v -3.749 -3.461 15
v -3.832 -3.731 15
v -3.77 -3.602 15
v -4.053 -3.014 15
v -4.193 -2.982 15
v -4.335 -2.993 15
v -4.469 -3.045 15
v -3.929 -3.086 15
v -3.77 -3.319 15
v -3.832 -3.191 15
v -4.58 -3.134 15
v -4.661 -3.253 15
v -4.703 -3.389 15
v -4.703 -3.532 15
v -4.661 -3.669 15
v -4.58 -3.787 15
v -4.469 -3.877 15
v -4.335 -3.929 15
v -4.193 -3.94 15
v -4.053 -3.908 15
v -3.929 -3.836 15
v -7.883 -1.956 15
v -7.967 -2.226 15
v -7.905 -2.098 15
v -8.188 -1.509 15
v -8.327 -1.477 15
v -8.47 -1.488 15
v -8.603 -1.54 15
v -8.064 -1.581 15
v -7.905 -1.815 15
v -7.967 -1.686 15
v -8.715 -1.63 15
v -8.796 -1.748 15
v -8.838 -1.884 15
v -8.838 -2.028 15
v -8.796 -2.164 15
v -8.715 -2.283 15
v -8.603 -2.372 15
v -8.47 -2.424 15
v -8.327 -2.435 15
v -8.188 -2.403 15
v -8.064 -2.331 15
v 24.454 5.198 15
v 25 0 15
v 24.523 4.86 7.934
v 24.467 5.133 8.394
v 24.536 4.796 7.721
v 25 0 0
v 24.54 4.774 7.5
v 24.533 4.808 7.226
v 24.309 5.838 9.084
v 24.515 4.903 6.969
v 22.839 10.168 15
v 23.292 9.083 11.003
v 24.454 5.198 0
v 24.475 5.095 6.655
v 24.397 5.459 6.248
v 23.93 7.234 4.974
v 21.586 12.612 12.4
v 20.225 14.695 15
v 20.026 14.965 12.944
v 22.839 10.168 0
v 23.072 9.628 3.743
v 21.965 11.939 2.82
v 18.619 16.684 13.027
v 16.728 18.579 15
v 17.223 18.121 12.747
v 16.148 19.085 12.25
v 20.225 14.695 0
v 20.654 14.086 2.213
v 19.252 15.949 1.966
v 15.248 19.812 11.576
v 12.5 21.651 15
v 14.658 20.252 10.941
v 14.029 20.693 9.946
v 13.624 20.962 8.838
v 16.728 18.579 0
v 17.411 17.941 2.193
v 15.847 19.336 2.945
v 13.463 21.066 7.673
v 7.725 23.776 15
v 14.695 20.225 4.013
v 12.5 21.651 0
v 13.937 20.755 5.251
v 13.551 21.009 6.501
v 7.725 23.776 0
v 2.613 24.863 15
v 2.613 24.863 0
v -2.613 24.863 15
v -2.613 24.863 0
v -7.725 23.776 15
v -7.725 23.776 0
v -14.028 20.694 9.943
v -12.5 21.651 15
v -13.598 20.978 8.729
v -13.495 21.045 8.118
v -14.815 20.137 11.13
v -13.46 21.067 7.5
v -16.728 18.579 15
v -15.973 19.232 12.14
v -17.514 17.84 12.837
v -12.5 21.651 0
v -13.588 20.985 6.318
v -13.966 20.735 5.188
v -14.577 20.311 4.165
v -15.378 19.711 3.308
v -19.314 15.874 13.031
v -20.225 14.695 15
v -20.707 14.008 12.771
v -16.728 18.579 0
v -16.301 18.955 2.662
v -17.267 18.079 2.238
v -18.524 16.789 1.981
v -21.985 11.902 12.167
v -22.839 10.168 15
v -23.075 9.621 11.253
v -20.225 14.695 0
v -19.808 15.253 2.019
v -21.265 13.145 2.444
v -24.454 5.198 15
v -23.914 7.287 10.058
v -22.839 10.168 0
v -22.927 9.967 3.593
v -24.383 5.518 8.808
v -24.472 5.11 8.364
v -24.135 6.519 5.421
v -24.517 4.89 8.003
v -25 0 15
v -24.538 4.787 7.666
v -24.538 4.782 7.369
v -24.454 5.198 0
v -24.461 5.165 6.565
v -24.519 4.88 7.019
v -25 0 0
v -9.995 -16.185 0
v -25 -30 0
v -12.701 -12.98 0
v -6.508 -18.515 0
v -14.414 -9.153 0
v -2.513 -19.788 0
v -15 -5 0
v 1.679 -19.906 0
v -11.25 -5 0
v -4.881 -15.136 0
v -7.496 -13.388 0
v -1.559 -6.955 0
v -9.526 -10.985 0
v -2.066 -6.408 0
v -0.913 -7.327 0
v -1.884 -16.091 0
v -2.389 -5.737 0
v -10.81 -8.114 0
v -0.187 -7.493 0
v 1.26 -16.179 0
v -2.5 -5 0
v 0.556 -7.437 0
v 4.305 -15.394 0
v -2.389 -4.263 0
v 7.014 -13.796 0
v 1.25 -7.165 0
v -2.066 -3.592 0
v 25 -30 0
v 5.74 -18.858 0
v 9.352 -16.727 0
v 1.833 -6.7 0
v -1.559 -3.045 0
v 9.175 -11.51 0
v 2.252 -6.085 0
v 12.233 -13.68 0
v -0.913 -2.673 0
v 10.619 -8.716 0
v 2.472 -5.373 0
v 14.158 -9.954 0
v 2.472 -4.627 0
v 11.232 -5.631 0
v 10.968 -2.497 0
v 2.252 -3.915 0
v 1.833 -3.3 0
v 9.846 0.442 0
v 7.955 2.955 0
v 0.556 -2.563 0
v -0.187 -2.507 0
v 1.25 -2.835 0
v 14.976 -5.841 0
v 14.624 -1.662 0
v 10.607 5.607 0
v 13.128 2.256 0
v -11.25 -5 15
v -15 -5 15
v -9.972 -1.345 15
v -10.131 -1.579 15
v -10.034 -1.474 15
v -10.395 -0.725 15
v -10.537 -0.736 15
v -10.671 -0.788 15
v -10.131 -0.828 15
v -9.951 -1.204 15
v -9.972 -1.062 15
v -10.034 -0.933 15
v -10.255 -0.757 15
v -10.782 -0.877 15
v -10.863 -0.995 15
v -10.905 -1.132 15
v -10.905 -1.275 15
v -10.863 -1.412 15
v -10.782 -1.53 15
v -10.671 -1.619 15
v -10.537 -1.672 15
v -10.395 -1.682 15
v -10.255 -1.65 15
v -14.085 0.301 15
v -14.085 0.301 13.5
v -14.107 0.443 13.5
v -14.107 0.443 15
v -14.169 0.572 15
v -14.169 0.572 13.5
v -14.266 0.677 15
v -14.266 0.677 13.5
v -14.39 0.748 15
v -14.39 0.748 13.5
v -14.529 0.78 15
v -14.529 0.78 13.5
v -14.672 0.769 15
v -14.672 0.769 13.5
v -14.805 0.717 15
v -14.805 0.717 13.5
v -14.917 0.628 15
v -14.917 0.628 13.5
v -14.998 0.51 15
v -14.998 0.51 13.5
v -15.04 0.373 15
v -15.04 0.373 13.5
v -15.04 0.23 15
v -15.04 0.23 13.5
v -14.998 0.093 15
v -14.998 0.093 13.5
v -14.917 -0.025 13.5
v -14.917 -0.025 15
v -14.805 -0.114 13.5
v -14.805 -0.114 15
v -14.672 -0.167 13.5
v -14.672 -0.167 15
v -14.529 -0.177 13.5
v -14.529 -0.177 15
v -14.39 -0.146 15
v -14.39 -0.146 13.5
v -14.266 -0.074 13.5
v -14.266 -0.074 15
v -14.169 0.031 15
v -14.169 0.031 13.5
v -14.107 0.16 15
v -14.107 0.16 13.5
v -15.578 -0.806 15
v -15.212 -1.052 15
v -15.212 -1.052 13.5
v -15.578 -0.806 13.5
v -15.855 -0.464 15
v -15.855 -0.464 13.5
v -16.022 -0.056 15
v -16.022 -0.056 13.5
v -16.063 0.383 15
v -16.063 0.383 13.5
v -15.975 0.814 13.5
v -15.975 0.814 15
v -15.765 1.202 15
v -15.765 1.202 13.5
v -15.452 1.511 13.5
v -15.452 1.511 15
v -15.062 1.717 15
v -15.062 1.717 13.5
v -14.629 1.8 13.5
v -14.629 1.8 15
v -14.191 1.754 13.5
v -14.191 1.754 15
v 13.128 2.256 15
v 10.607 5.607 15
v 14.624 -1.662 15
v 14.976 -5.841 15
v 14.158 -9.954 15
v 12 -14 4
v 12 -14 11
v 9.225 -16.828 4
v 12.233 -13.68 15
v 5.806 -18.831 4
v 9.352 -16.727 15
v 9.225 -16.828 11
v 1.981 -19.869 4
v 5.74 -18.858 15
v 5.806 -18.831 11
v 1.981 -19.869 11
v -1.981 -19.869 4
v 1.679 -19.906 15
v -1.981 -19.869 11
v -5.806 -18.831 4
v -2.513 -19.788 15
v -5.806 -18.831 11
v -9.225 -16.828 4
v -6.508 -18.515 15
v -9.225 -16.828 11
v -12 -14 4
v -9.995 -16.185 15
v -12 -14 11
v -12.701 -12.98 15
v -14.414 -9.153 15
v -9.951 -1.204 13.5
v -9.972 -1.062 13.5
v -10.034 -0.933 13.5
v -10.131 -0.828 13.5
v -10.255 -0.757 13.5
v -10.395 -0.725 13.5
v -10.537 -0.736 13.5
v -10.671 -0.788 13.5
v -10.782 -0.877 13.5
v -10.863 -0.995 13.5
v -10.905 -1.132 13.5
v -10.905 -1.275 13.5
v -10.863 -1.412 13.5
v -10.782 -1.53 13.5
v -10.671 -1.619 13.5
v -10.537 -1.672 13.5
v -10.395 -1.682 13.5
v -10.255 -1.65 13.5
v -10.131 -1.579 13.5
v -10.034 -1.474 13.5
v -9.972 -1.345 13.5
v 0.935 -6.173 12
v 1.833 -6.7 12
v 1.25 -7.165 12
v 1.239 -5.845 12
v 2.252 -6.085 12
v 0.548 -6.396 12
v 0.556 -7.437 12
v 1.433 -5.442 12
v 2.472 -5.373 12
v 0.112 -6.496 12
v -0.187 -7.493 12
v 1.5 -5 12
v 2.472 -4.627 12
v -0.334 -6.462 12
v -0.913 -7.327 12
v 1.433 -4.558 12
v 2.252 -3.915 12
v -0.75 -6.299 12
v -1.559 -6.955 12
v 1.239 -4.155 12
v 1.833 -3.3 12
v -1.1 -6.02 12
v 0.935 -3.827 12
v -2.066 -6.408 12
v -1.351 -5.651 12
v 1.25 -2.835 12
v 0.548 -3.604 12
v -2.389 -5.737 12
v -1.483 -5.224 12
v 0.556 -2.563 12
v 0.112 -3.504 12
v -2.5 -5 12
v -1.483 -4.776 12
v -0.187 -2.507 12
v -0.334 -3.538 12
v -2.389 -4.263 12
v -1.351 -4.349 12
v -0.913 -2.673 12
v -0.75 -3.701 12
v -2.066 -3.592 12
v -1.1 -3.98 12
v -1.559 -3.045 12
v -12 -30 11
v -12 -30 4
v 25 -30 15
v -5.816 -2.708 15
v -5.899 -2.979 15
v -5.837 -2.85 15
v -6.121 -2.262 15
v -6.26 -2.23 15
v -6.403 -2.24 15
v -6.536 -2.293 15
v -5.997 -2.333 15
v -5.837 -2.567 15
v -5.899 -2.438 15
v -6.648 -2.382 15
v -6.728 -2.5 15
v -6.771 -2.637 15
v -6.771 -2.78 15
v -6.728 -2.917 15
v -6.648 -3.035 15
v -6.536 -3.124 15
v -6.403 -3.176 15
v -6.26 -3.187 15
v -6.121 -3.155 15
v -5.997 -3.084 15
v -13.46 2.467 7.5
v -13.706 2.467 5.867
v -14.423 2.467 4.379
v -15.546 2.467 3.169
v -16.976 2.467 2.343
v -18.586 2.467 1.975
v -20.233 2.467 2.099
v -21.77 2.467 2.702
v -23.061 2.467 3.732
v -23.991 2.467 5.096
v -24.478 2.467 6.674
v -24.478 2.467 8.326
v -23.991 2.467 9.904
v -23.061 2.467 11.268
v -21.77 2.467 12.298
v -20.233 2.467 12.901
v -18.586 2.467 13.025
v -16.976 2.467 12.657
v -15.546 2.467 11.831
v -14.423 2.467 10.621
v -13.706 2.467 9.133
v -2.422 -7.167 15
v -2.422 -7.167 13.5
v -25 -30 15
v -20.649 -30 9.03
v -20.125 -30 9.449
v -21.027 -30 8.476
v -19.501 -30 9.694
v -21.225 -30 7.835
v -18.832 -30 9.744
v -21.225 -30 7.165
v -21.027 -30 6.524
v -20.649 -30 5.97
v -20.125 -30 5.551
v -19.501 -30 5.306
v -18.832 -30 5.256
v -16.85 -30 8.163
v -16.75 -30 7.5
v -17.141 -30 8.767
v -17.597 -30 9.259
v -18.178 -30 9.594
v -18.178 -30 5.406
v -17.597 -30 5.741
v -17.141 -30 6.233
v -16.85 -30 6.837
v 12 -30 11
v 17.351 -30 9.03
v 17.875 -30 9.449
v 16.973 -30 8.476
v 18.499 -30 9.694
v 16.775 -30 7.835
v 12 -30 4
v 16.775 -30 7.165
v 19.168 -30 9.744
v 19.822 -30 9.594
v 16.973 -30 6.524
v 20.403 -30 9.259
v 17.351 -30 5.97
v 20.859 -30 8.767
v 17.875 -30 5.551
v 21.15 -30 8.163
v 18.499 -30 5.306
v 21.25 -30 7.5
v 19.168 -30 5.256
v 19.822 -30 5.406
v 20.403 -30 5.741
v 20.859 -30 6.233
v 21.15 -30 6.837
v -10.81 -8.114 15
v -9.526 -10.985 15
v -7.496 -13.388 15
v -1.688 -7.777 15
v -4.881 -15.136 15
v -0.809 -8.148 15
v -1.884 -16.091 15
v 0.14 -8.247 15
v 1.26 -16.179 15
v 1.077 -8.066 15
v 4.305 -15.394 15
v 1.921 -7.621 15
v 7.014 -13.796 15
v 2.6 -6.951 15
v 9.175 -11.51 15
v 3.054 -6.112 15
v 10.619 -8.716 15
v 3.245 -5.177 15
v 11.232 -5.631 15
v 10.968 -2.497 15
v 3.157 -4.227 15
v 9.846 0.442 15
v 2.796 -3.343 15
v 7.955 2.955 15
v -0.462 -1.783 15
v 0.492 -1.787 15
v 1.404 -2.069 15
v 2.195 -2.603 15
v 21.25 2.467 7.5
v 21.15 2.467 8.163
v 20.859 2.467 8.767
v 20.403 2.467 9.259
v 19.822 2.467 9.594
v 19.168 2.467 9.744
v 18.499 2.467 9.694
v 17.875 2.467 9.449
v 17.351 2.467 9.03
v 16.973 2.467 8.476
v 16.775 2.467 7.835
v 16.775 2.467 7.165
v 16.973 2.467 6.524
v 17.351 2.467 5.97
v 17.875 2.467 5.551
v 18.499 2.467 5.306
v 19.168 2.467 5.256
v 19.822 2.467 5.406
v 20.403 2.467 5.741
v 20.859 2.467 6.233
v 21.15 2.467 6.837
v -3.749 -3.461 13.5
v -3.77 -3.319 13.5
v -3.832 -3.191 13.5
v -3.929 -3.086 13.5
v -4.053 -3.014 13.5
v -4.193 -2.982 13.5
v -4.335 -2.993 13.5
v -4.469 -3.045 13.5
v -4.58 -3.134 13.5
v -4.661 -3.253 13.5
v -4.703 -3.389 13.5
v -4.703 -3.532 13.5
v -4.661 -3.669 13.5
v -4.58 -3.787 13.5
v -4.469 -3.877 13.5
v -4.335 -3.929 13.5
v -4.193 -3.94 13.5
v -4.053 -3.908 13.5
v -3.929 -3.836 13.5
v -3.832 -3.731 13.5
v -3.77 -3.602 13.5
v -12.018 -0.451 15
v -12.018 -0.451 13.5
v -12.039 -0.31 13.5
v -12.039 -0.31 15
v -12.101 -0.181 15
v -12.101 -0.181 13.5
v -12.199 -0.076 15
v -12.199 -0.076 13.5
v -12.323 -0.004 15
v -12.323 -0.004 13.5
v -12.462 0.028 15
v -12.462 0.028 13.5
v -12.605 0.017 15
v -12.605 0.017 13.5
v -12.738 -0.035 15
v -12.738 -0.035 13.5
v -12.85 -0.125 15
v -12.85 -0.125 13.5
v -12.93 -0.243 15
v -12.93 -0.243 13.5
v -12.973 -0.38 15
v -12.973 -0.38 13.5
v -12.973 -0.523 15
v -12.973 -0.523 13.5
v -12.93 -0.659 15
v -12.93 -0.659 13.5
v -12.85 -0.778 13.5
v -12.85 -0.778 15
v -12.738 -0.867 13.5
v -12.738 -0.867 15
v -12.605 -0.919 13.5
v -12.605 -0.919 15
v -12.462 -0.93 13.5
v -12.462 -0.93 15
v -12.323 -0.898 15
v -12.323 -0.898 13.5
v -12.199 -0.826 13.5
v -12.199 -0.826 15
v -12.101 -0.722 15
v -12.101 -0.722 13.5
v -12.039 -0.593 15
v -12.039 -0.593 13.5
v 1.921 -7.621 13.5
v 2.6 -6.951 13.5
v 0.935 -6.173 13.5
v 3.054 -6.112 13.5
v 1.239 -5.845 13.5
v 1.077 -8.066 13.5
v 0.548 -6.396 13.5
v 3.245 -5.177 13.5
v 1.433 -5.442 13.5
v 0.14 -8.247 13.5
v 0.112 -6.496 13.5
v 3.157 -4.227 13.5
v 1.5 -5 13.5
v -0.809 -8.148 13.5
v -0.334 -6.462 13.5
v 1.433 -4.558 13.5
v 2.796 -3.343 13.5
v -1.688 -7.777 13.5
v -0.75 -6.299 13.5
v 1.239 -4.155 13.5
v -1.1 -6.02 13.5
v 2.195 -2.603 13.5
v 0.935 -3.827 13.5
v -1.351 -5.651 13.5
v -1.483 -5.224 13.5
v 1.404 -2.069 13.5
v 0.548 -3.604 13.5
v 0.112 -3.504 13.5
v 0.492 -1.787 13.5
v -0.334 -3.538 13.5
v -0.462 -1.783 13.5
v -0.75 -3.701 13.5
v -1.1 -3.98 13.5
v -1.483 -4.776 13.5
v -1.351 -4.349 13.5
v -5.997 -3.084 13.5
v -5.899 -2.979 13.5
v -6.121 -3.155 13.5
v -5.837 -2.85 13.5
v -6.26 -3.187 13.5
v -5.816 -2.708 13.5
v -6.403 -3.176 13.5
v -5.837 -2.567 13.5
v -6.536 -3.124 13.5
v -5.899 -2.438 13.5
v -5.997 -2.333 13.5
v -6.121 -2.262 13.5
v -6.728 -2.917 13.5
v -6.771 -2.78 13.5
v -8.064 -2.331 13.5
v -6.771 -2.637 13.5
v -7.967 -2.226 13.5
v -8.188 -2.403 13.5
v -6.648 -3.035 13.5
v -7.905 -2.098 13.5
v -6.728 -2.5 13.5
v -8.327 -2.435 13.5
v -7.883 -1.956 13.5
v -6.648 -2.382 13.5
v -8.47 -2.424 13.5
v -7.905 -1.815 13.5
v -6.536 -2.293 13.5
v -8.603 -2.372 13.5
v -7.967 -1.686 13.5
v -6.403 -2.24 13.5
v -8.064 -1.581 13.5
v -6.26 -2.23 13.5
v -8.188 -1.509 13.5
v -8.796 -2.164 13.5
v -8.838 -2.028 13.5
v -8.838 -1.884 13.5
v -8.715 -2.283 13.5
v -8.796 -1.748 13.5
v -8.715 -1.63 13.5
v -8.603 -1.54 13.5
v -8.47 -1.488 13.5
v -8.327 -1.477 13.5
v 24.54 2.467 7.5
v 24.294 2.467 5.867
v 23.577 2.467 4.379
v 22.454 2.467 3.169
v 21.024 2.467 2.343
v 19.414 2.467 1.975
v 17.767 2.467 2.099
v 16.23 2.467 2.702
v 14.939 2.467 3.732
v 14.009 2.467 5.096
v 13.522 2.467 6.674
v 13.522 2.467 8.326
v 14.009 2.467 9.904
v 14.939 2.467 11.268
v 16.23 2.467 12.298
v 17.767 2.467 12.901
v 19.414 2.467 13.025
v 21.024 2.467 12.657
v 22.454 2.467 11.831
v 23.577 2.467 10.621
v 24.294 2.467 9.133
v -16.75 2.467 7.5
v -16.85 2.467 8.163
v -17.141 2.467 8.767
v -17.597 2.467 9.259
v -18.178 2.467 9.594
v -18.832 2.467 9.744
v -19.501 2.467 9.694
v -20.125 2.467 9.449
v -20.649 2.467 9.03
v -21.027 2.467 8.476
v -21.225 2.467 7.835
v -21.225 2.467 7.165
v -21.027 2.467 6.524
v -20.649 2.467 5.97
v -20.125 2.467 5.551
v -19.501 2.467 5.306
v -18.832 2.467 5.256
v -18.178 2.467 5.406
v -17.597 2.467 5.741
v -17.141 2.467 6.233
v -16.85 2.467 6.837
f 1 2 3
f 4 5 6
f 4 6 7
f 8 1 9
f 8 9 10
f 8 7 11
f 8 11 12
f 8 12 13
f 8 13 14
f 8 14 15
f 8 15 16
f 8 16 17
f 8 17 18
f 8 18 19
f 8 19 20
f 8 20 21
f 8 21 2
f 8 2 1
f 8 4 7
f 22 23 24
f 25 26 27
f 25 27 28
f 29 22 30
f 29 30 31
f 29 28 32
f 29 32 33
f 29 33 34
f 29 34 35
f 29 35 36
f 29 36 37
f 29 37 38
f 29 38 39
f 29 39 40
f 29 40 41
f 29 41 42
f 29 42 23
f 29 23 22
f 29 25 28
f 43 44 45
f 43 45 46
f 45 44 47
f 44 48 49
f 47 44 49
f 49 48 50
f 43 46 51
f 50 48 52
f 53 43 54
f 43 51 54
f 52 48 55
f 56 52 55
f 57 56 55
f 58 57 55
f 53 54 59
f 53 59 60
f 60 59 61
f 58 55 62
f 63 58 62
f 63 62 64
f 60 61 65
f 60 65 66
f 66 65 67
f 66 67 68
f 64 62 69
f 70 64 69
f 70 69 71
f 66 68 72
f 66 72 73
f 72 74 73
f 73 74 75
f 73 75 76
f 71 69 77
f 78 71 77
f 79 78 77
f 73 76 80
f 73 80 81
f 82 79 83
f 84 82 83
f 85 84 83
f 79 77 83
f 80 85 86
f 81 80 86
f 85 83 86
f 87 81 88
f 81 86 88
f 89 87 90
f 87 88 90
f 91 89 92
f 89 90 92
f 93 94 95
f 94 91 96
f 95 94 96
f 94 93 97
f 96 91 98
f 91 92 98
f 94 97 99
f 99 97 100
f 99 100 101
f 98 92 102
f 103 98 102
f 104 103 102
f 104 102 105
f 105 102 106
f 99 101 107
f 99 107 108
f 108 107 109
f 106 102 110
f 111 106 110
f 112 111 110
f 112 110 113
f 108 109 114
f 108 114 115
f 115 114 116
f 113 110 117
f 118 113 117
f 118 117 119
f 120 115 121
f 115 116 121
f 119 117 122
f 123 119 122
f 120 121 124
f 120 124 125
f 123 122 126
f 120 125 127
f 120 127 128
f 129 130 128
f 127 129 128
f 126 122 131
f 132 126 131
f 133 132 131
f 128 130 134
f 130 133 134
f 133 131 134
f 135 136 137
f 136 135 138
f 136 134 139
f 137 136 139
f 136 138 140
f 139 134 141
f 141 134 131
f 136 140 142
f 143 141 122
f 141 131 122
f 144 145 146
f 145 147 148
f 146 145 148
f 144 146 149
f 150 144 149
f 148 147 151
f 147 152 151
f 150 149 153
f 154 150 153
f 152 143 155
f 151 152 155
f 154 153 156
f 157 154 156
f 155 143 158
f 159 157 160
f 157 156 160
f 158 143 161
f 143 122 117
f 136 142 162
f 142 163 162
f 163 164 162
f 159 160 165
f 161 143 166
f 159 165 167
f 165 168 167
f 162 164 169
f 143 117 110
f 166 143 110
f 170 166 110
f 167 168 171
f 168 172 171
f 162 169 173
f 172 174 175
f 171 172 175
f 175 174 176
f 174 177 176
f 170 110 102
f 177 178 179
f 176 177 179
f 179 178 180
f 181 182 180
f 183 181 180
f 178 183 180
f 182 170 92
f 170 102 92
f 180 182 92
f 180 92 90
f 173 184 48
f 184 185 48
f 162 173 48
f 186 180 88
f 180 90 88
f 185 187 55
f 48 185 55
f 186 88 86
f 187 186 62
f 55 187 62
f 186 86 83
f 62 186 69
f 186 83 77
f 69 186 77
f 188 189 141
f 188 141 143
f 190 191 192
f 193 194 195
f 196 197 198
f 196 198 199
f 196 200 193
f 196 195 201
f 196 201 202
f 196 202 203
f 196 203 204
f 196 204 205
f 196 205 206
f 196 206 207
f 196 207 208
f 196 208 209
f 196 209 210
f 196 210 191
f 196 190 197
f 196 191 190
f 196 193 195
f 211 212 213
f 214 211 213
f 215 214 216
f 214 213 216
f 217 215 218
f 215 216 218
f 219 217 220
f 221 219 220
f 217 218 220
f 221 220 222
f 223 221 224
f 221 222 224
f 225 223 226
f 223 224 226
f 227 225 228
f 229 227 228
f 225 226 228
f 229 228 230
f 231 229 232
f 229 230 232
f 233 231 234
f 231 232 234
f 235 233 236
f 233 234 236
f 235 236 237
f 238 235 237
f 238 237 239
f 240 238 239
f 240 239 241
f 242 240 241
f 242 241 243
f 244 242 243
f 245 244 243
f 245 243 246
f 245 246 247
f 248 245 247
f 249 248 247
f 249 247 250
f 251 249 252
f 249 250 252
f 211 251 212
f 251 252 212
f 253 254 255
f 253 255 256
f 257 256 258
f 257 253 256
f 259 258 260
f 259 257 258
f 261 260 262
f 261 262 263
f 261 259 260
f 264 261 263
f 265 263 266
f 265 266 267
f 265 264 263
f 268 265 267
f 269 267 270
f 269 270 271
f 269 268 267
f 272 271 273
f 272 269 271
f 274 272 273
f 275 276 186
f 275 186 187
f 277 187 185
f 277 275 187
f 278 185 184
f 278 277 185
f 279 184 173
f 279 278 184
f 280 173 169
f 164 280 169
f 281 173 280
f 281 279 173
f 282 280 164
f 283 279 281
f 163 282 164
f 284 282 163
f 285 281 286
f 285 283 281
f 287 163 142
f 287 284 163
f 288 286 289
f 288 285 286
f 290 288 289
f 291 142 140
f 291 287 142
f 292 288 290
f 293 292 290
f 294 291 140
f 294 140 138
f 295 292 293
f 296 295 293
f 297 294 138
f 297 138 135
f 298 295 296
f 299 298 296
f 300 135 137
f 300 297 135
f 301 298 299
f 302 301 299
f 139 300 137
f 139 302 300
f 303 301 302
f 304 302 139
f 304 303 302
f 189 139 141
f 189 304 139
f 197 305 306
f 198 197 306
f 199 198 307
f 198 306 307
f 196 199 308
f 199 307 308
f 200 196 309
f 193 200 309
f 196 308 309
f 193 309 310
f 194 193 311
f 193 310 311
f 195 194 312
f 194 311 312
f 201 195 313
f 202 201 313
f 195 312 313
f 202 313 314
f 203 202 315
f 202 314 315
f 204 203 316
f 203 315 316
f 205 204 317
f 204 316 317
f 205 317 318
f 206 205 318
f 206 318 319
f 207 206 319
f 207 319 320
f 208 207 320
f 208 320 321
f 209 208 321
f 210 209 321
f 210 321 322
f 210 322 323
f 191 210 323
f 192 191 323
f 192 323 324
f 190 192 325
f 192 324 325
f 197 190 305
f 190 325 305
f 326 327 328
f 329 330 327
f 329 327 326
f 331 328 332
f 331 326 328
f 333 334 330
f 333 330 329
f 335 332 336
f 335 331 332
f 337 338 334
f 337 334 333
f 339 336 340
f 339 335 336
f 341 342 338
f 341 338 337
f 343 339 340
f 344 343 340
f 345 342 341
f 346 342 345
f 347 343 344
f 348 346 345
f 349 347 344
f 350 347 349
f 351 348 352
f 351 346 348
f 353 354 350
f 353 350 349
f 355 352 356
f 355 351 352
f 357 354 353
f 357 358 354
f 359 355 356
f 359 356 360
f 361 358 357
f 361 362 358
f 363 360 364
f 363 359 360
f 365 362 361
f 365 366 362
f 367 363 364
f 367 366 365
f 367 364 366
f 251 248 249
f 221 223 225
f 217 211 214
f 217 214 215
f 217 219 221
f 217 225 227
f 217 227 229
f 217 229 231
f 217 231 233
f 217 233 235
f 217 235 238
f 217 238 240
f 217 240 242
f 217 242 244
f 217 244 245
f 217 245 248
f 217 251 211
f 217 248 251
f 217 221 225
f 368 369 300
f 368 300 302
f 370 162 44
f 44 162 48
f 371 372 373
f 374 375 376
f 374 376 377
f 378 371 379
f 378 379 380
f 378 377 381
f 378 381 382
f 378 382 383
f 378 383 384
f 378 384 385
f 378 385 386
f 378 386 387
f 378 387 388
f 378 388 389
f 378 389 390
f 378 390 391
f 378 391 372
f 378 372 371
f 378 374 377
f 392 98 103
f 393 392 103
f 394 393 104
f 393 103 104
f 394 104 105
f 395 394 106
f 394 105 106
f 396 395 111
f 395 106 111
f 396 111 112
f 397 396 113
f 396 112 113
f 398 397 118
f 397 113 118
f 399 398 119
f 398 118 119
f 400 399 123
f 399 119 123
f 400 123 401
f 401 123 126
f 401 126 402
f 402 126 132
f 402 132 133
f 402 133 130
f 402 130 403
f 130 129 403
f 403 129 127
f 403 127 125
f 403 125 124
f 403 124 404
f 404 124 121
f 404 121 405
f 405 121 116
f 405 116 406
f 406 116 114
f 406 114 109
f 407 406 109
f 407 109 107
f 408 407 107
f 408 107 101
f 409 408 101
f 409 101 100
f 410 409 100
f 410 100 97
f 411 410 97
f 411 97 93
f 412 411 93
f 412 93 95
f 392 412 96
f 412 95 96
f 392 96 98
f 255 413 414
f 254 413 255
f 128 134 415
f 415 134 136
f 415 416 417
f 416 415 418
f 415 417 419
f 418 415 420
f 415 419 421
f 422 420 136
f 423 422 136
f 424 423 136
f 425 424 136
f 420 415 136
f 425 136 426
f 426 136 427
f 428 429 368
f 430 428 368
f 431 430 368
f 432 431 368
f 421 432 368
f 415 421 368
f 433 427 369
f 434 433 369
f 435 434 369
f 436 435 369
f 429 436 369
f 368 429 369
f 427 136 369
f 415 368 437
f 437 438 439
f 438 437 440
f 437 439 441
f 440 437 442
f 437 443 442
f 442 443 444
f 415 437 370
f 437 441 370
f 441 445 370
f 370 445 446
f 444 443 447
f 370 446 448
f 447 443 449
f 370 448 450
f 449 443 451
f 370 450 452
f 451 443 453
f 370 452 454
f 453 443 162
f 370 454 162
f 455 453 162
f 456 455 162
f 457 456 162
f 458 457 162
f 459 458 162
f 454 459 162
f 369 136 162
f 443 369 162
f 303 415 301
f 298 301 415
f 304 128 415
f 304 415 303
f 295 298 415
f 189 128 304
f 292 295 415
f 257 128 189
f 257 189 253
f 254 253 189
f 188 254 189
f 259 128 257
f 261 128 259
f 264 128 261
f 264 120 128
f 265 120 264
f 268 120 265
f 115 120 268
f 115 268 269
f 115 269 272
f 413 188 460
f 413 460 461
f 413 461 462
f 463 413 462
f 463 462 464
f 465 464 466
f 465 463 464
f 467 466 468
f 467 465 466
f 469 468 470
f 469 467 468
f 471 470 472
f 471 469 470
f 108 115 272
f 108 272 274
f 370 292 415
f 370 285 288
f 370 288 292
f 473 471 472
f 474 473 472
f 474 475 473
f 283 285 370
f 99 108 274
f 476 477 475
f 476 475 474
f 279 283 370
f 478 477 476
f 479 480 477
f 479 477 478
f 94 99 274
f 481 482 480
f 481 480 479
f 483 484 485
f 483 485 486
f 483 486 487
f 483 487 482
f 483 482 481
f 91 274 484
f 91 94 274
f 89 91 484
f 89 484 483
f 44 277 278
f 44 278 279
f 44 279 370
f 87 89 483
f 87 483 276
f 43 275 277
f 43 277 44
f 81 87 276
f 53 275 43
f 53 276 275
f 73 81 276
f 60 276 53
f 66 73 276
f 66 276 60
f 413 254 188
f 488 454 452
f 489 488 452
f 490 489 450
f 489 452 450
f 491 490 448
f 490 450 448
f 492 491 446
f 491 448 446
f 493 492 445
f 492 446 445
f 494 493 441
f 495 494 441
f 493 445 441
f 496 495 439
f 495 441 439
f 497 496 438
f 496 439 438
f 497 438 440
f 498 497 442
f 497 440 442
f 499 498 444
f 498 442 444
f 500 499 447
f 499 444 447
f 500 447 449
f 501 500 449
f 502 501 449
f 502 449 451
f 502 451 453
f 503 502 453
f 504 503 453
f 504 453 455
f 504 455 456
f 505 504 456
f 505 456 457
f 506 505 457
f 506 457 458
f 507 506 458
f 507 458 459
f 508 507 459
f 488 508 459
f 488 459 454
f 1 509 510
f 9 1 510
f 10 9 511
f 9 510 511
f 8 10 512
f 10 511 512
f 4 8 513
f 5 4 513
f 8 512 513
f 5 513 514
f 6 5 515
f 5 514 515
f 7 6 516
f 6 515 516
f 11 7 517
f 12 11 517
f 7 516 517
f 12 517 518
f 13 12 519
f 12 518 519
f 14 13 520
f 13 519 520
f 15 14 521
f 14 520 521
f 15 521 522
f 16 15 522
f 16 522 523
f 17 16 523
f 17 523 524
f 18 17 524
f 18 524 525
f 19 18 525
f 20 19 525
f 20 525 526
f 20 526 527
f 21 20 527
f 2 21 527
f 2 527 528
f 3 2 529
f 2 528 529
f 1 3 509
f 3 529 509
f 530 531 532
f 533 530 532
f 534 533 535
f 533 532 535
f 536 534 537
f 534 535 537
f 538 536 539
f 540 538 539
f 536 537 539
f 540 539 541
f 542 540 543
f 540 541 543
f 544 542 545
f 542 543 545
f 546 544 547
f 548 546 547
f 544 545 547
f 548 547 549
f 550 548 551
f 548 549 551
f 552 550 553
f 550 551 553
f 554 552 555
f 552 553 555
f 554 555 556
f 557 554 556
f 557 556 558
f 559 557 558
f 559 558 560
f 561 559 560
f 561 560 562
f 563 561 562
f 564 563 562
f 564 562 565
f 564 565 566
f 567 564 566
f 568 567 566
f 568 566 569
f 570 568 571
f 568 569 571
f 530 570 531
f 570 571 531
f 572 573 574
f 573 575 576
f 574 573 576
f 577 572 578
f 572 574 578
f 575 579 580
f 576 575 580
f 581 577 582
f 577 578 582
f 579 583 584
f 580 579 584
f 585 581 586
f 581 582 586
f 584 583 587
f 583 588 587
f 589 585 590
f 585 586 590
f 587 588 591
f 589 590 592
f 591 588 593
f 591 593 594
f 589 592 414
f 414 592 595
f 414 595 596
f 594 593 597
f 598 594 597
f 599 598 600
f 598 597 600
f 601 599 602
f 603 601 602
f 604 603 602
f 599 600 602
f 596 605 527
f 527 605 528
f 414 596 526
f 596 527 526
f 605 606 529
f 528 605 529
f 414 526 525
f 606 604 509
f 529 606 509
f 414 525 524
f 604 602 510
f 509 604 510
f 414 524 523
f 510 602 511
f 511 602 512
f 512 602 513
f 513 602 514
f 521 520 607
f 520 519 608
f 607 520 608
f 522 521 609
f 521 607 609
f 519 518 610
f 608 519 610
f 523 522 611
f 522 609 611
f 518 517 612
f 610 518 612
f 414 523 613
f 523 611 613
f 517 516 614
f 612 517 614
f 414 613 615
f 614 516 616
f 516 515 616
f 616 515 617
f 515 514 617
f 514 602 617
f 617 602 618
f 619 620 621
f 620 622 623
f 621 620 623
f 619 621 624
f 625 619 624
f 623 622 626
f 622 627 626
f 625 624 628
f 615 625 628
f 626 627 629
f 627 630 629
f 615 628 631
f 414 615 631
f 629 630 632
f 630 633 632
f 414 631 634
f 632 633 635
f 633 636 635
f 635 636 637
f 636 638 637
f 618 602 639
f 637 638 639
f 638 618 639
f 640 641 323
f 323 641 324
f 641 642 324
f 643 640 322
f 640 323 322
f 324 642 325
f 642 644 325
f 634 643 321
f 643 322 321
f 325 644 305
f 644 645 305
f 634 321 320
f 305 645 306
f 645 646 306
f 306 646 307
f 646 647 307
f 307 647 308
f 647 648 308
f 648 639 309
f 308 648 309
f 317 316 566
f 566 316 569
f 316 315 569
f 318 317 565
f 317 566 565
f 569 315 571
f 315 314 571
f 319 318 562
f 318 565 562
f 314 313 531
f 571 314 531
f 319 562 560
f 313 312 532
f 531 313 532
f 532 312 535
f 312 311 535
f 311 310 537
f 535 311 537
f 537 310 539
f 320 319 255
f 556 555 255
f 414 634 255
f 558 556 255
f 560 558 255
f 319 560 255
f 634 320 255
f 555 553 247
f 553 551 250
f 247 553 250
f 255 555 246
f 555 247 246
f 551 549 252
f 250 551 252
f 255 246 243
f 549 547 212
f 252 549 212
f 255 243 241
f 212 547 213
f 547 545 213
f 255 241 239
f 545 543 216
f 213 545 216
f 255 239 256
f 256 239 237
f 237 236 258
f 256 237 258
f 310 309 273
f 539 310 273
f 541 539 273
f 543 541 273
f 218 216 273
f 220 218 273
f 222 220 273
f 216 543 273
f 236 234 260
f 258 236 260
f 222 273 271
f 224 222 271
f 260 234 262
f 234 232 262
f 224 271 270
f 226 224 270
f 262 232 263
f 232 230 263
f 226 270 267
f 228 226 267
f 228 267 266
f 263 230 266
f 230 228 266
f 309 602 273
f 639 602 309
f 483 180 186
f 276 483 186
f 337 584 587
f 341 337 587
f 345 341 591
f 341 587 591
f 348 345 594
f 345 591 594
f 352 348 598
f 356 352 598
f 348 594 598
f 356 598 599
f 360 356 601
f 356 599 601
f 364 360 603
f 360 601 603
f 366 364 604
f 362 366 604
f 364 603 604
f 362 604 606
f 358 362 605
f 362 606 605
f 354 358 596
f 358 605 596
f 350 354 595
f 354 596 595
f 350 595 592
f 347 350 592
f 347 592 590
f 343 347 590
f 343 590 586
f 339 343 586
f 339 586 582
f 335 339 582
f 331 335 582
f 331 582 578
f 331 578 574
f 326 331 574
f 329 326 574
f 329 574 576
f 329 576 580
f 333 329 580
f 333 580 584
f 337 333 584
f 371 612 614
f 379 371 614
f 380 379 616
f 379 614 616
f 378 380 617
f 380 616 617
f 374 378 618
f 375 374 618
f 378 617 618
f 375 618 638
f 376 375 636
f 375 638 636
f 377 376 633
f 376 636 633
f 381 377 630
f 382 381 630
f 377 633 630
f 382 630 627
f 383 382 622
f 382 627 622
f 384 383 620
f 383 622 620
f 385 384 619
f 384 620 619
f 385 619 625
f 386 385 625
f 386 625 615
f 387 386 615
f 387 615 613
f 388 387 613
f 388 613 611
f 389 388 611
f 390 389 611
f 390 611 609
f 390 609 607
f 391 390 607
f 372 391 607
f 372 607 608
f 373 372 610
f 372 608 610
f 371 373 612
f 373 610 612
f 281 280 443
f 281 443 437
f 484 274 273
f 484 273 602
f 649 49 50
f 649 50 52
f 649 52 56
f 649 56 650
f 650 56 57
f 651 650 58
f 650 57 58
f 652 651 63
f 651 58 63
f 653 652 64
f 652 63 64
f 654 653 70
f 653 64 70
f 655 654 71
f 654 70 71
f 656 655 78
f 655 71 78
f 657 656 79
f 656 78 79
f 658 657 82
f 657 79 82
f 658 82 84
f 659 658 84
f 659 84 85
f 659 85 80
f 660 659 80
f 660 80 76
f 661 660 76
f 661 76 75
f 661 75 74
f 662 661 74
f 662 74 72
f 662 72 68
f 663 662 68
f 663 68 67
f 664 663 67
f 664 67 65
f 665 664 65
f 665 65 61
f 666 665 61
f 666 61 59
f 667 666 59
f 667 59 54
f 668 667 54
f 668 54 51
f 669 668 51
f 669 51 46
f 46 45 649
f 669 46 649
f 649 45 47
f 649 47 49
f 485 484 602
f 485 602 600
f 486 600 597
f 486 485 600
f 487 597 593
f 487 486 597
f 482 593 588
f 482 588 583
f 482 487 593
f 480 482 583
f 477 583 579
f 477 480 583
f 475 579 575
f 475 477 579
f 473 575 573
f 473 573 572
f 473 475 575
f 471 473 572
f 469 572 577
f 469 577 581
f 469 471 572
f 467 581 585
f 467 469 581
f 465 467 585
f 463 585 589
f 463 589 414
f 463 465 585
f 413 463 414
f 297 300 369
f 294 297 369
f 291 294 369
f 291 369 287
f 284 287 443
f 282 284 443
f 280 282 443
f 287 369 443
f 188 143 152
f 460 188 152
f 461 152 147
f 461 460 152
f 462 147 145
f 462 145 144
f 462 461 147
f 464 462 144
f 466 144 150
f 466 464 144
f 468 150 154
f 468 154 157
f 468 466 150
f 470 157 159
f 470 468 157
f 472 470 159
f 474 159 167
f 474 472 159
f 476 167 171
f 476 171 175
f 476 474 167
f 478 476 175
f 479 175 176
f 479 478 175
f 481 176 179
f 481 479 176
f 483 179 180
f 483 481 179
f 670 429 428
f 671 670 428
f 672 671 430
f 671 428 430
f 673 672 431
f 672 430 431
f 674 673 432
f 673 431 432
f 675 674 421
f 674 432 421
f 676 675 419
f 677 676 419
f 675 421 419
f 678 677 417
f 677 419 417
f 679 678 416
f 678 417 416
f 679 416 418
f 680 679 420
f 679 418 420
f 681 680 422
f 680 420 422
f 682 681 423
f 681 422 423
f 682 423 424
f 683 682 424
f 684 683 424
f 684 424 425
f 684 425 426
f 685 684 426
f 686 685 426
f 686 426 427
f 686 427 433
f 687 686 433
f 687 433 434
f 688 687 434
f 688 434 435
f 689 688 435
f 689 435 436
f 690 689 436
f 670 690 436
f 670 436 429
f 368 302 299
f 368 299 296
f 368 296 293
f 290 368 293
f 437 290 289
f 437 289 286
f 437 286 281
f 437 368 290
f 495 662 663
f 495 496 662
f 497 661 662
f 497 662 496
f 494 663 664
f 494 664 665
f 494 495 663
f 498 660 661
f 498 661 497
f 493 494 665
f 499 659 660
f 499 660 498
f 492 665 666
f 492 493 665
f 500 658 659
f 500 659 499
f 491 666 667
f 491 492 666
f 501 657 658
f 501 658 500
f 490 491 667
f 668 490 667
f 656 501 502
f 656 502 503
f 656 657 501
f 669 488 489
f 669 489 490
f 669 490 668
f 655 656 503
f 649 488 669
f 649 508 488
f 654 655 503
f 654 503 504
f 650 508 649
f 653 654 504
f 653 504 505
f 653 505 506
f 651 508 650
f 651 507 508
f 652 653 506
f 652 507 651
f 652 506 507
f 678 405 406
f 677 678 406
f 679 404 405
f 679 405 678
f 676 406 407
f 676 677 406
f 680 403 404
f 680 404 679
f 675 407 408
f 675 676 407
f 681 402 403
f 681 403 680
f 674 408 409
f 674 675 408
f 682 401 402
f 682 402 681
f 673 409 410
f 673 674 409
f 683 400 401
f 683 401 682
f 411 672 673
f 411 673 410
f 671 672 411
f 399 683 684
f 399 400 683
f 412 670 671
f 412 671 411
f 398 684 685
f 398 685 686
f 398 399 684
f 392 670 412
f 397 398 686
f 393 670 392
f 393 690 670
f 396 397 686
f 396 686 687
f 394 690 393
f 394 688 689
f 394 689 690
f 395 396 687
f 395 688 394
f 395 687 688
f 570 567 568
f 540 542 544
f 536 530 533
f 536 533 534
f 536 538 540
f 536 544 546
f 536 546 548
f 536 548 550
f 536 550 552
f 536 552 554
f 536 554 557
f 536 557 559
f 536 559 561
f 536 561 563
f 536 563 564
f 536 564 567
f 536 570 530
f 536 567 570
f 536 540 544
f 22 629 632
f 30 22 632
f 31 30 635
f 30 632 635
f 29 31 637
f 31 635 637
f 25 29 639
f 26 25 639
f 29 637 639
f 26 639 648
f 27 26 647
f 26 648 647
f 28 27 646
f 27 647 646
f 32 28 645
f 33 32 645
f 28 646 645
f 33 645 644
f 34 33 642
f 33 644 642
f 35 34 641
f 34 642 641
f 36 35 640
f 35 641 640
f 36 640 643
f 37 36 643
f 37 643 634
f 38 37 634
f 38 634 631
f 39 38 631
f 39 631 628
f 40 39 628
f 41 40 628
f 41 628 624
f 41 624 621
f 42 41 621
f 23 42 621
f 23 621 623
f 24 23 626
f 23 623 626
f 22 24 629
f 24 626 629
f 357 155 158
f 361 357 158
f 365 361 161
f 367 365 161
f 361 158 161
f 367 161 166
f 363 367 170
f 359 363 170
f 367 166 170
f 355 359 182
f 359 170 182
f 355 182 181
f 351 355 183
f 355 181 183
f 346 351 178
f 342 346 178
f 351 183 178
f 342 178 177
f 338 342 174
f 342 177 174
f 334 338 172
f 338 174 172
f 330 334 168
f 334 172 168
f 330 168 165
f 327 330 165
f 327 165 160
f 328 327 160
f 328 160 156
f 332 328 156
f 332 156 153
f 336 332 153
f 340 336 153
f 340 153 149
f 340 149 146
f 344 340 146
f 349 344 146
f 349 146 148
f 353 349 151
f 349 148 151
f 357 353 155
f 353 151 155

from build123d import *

# Parameters (mm, degrees)
BOSS_EXTRUDE1_DEPTH = 15
CUT_EXTRUDE1_REACH  = 17
CUT_EXTRUDE2_DEPTH  = 1.5
CUT_EXTRUDE3_REACH  = 15.5
SKETCH4_R           = 1.5
SKETCH5_R           = 2.5
CUT_EXTRUDE4_DEPTH  = 12
SKETCH6_R           = 0.48
BOSS_EXTRUDE2_DEPTH = 1.5
CUT_EXTRUDE5_REACH  = 57
SKETCH7_R           = 2.25
SKETCH8_R           = 5.54
CUT_EXTRUDE6_DEPTH  = 21
CUT_EXTRUDE7_REACH  = 57
SKETCH9_W           = 24
SKETCH9_H           = 7


with BuildPart() as part:
    # Sketch1 → Boss-Extrude1 (new body)
    with BuildSketch(Plane.XY):
        with BuildLine():
            Line((-25, 0), (-25, -30))
            Line((-25, -30), (25, -30))
            Line((25, -30), (25, 0))
            ThreePointArc((25, 0), (0, 25), (-25, 0))
        make_face()
    extrude(amount=BOSS_EXTRUDE1_DEPTH)

    # Sketch2 → Cut-Extrude1 (cut, up to next)
    with BuildSketch(Plane.XY.offset(15), mode=Mode.PRIVATE) as cut_extrude1_sk1:
        with BuildLine():
            Line((-15, -5), (-11.25, -5))
            ThreePointArc((-11.25, -5), (4.305188614, -15.393644741), (7.954951288, 2.954951288))
            Line((7.954951288, 2.954951288), (10.606601718, 5.606601718))
            ThreePointArc((10.606601718, 5.606601718), (5.740251485, -18.858192988), (-15, -5))
        make_face()
    cut_extrude1_tool1 = extrude(cut_extrude1_sk1.sketch, amount=-CUT_EXTRUDE1_REACH, mode=Mode.PRIVATE) & part.part
    add(cut_extrude1_tool1.solids().sort_by_distance((9.559676, 4.001877, 15))[0], mode=Mode.SUBTRACT)

    # Sketch3 → Cut-Extrude2 (cut)
    with BuildSketch(Plane.XY.offset(15)):
        with BuildLine():
            Line((-14.191020378, 1.753883373), (-0.462045472, -1.78301166))
            ThreePointArc((-0.462045472, -1.78301166), (3.054001018, -6.111565466), (-2.421787612, -7.167358937))
            Line((-2.421787612, -7.167358937), (-15.212264853, -1.05196276))
            ThreePointArc((-15.212264853, -1.05196276), (-15.974774553, 0.814342437), (-14.191020378, 1.753883373))
        make_face()
    extrude(amount=-CUT_EXTRUDE2_DEPTH, mode=Mode.SUBTRACT)

    # Sketch4 → Cut-Extrude3 (cut, up to next)
    with BuildSketch(Plane.XY.offset(13.5), mode=Mode.PRIVATE) as cut_extrude3_sk1:
        with Locations((0, -5)):
            Circle(SKETCH4_R)
    cut_extrude3_tool1 = extrude(cut_extrude3_sk1.sketch, amount=-CUT_EXTRUDE3_REACH, mode=Mode.PRIVATE) & part.part
    add(cut_extrude3_tool1.solids().sort_by_distance((0, -5, 13.5))[0], mode=Mode.SUBTRACT)

    # Sketch5 → Cut-Extrude4 (cut)
    with BuildSketch(Plane(origin=(0, 0, 0), x_dir=(-1, 0, 0), z_dir=(0, 0, -1))):
        with Locations((0, -5)):
            Circle(SKETCH5_R)
    extrude(amount=-CUT_EXTRUDE4_DEPTH, mode=Mode.SUBTRACT)

    # Sketch6 → Boss-Extrude2 (add)
    with BuildSketch(Plane.XY.offset(13.5)):
        with Locations((-14.565235622, 0.301312222)):
            Circle(SKETCH6_R)
        with Locations((-12.497911856, -0.451132094)):
            Circle(SKETCH6_R)
        with Locations((-10.430588091, -1.203576409)):
            Circle(SKETCH6_R)
        with Locations((-8.363264325, -1.956020724)):
            Circle(SKETCH6_R)
        with Locations((-6.295940559, -2.70846504)):
            Circle(SKETCH6_R)
        with Locations((-4.228616794, -3.460909355)):
            Circle(SKETCH6_R)
    extrude(amount=BOSS_EXTRUDE2_DEPTH)

    # Sketch7 → Cut-Extrude5 (cut, up to next)
    with BuildSketch(Plane.XZ.offset(30), mode=Mode.PRIVATE) as cut_extrude5_sk1:
        with Locations((-19, 7.5)):
            Circle(SKETCH7_R)
    cut_extrude5_tool1 = extrude(cut_extrude5_sk1.sketch, amount=-CUT_EXTRUDE5_REACH, mode=Mode.PRIVATE) & part.part
    add(cut_extrude5_tool1.solids().sort_by_distance((-19, -30, 7.5))[0], mode=Mode.SUBTRACT)
    # Sketch7 → Cut-Extrude5 (cut, up to next)
    with BuildSketch(Plane.XZ.offset(30), mode=Mode.PRIVATE) as cut_extrude5_sk2:
        with Locations((19, 7.5)):
            Circle(SKETCH7_R)
    cut_extrude5_tool2 = extrude(cut_extrude5_sk2.sketch, amount=-CUT_EXTRUDE5_REACH, mode=Mode.PRIVATE) & part.part
    add(cut_extrude5_tool2.solids().sort_by_distance((19, -30, 7.5))[0], mode=Mode.SUBTRACT)

    # Sketch8 → Cut-Extrude6 (cut)
    with BuildSketch(Plane(origin=(0, 23.467134405, 0), x_dir=(1, 0, 0), z_dir=(0, 1, 0))):
        with Locations((-19, -7.5)):
            Circle(SKETCH8_R)
        with Locations((19, -7.5)):
            Circle(SKETCH8_R)
    extrude(amount=-CUT_EXTRUDE6_DEPTH, mode=Mode.SUBTRACT)

    # Sketch9 → Cut-Extrude7 (cut, up to next)
    with BuildSketch(Plane.XZ.offset(30), mode=Mode.PRIVATE) as cut_extrude7_sk1:
        with Locations((0, 7.5)):
            Rectangle(SKETCH9_W, SKETCH9_H)
    cut_extrude7_tool1 = extrude(cut_extrude7_sk1.sketch, amount=-CUT_EXTRUDE7_REACH, mode=Mode.PRIVATE) & part.part
    add(cut_extrude7_tool1.solids().sort_by_distance((0, -30, 7.5))[0], mode=Mode.SUBTRACT)


solid = part.part
